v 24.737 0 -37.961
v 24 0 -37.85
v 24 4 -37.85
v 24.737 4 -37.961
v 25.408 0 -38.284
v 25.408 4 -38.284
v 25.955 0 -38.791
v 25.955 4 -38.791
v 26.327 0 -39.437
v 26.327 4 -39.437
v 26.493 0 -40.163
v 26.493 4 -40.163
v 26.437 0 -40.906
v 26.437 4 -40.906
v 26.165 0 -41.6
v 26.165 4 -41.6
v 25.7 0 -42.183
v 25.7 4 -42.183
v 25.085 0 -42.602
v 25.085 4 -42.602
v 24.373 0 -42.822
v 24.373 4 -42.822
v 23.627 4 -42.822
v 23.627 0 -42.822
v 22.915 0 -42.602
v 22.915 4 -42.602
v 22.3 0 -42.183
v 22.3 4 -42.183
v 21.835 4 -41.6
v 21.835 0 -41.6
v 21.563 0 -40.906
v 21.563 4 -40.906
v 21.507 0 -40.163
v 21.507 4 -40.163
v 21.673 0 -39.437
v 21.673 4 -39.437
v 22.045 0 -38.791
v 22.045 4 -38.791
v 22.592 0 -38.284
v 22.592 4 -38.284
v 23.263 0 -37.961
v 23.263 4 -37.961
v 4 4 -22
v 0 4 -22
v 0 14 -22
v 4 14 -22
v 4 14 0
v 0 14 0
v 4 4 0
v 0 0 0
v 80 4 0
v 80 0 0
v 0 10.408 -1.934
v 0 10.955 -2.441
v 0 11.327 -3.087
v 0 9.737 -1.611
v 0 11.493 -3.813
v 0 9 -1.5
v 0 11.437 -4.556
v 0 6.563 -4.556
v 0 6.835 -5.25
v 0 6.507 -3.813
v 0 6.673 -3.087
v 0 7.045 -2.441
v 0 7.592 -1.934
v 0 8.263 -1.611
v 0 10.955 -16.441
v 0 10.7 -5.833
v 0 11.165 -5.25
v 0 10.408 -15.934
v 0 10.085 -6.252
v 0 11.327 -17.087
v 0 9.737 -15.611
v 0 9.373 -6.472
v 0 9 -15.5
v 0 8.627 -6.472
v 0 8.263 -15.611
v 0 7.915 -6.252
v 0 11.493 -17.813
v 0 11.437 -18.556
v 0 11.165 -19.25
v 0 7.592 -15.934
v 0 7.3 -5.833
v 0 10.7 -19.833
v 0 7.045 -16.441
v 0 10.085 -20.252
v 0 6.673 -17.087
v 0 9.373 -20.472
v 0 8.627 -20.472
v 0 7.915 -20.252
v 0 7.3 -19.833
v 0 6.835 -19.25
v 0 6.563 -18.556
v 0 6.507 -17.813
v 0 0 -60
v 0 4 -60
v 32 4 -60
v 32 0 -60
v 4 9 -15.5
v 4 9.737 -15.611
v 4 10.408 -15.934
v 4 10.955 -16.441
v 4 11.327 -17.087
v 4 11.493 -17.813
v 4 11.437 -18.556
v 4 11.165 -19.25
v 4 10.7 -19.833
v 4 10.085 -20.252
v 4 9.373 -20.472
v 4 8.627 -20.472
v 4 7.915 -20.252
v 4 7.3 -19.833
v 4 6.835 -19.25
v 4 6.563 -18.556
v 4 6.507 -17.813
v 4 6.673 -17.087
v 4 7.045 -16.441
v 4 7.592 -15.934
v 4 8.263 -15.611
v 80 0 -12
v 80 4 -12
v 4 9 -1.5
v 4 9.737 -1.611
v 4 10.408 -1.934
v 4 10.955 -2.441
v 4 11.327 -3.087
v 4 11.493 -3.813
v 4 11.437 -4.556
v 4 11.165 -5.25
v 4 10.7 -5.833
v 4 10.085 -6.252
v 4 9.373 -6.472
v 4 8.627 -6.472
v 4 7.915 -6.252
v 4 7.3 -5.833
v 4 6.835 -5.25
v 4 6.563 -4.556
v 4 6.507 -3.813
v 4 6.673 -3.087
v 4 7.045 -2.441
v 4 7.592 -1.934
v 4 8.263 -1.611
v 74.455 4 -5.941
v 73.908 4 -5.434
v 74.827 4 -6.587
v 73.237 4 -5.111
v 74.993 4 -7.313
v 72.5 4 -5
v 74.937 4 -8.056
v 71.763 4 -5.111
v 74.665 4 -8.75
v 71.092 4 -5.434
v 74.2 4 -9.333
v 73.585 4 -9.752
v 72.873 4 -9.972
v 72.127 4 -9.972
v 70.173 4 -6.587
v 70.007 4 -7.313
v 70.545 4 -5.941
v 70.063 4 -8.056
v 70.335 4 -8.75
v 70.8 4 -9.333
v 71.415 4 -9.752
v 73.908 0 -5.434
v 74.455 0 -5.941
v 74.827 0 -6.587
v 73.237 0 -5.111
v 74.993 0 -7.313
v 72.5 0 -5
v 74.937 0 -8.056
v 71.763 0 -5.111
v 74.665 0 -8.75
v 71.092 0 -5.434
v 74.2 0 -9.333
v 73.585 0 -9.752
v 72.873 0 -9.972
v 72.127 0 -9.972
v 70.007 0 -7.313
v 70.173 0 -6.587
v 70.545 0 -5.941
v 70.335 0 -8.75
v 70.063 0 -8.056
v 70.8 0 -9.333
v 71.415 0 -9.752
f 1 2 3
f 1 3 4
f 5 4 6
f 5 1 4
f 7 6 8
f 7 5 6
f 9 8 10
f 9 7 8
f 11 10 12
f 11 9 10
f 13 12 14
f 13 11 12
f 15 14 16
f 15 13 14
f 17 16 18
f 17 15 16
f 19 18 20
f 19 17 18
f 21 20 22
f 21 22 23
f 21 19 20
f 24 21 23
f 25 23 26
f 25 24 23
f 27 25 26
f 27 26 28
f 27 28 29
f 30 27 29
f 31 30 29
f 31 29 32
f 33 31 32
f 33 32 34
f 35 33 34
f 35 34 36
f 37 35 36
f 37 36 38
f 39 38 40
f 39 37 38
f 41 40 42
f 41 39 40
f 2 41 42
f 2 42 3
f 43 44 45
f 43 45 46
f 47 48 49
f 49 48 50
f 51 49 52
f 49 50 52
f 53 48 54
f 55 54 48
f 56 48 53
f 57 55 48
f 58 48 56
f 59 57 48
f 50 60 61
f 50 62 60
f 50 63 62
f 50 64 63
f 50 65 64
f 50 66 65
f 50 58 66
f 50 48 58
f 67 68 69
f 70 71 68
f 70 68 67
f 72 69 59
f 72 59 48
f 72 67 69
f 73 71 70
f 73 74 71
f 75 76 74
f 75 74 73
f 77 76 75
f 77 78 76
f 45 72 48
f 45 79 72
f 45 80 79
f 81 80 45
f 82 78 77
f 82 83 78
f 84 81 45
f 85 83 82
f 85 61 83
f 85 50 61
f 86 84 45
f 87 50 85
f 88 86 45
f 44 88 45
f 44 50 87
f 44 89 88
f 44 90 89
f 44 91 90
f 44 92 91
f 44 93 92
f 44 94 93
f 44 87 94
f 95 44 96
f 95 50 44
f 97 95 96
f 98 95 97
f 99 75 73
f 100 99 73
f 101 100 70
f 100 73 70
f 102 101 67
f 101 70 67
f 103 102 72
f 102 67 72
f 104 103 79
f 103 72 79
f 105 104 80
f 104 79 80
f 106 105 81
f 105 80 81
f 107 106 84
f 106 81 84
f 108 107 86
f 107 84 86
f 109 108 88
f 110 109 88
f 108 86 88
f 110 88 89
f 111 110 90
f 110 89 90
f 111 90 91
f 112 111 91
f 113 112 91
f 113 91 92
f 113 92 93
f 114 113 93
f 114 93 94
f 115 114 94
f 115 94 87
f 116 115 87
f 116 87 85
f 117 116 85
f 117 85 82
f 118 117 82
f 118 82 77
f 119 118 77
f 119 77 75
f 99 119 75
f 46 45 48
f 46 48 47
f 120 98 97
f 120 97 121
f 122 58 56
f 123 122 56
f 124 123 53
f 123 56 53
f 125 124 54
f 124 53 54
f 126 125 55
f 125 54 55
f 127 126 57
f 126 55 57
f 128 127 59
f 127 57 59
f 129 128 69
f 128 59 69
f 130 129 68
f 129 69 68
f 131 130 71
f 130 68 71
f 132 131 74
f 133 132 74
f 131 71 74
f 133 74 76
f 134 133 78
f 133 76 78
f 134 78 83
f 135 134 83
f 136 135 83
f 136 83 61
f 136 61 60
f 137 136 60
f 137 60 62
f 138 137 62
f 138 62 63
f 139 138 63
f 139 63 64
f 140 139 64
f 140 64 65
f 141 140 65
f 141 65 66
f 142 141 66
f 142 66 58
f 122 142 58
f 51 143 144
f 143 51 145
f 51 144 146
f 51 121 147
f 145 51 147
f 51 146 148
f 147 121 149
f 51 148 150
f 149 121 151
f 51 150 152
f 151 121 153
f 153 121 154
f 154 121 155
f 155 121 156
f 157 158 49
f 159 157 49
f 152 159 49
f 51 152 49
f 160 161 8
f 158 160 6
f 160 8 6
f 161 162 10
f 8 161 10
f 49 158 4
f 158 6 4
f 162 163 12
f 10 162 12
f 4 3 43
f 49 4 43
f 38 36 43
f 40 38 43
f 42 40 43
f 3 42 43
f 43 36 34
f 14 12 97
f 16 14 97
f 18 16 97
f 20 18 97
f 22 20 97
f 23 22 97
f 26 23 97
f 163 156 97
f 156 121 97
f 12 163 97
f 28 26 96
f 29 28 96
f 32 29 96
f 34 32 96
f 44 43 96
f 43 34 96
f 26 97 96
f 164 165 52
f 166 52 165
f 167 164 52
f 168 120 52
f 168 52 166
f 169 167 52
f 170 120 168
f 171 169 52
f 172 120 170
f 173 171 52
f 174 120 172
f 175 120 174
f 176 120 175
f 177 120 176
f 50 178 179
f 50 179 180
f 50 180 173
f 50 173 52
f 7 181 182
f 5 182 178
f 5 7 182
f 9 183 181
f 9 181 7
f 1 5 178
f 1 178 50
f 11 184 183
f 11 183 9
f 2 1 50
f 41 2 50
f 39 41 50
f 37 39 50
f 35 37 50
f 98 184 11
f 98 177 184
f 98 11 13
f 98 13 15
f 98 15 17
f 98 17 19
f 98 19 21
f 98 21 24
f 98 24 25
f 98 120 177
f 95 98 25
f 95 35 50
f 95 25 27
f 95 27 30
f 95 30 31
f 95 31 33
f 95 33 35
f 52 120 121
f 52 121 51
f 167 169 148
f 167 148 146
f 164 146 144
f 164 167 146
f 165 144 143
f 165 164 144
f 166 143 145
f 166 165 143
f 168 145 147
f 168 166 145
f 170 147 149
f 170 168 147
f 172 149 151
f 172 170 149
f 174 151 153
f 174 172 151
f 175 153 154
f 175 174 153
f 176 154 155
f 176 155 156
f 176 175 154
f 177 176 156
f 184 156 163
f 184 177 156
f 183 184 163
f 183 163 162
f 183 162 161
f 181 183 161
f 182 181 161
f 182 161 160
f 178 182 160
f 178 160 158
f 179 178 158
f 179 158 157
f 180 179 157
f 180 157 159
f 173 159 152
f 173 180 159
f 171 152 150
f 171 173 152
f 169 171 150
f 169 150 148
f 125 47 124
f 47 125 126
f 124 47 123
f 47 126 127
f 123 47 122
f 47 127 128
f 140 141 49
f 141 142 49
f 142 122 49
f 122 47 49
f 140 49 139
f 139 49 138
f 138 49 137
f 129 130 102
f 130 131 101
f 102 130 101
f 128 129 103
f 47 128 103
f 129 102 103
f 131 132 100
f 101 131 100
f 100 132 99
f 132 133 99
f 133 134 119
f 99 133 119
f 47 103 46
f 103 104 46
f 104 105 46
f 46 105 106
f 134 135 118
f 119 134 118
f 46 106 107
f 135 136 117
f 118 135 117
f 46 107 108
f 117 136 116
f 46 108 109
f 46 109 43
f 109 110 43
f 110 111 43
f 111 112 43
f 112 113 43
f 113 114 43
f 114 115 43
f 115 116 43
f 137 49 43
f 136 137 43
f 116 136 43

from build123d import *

# Parameters (mm, degrees)
SKETCH1_R           = 2.5
BOSS_EXTRUDE1_DEPTH = 4
SKETCH2_W           = 4
SKETCH2_H           = 22
BOSS_EXTRUDE2_DEPTH = 10
SKETCH3_R           = 2.5
CUT_EXTRUDE1_DEPTH  = 20


with BuildPart() as part:
    # Sketch1 → Boss-Extrude1 (new body)
    with BuildSketch(Plane(origin=(0, 0, 0), x_dir=(1, 0, 0), z_dir=(0, 1, 0))):
        Polygon((32, 60), (80, 12), (80, 0), (0, 0), (0, 60), align=None)
        with Locations(Location((24, 40.35, 0), (0, 0, 270))):
            Circle(SKETCH1_R, mode=Mode.SUBTRACT)
        with Locations(Location((72.5, 7.5, 0), (0, 0, 270))):
            Circle(SKETCH1_R, mode=Mode.SUBTRACT)
    extrude(amount=BOSS_EXTRUDE1_DEPTH)

    # Sketch2 → Boss-Extrude2 (add)
    with BuildSketch(Plane(origin=(0, 4, 0), x_dir=(1, 0, 0), z_dir=(0, 1, 0))):
        with Locations((2, 11)):
            Rectangle(SKETCH2_W, SKETCH2_H)
    extrude(amount=BOSS_EXTRUDE2_DEPTH)

    # Sketch3 → Cut-Extrude1 (cut)
    with BuildSketch(Plane.ZY):
        with Locations((-18, 9)):
            Circle(SKETCH3_R)
        with Locations((-4, 9)):
            Circle(SKETCH3_R)
    extrude(amount=-CUT_EXTRUDE1_DEPTH, mode=Mode.SUBTRACT)


solid = part.part
